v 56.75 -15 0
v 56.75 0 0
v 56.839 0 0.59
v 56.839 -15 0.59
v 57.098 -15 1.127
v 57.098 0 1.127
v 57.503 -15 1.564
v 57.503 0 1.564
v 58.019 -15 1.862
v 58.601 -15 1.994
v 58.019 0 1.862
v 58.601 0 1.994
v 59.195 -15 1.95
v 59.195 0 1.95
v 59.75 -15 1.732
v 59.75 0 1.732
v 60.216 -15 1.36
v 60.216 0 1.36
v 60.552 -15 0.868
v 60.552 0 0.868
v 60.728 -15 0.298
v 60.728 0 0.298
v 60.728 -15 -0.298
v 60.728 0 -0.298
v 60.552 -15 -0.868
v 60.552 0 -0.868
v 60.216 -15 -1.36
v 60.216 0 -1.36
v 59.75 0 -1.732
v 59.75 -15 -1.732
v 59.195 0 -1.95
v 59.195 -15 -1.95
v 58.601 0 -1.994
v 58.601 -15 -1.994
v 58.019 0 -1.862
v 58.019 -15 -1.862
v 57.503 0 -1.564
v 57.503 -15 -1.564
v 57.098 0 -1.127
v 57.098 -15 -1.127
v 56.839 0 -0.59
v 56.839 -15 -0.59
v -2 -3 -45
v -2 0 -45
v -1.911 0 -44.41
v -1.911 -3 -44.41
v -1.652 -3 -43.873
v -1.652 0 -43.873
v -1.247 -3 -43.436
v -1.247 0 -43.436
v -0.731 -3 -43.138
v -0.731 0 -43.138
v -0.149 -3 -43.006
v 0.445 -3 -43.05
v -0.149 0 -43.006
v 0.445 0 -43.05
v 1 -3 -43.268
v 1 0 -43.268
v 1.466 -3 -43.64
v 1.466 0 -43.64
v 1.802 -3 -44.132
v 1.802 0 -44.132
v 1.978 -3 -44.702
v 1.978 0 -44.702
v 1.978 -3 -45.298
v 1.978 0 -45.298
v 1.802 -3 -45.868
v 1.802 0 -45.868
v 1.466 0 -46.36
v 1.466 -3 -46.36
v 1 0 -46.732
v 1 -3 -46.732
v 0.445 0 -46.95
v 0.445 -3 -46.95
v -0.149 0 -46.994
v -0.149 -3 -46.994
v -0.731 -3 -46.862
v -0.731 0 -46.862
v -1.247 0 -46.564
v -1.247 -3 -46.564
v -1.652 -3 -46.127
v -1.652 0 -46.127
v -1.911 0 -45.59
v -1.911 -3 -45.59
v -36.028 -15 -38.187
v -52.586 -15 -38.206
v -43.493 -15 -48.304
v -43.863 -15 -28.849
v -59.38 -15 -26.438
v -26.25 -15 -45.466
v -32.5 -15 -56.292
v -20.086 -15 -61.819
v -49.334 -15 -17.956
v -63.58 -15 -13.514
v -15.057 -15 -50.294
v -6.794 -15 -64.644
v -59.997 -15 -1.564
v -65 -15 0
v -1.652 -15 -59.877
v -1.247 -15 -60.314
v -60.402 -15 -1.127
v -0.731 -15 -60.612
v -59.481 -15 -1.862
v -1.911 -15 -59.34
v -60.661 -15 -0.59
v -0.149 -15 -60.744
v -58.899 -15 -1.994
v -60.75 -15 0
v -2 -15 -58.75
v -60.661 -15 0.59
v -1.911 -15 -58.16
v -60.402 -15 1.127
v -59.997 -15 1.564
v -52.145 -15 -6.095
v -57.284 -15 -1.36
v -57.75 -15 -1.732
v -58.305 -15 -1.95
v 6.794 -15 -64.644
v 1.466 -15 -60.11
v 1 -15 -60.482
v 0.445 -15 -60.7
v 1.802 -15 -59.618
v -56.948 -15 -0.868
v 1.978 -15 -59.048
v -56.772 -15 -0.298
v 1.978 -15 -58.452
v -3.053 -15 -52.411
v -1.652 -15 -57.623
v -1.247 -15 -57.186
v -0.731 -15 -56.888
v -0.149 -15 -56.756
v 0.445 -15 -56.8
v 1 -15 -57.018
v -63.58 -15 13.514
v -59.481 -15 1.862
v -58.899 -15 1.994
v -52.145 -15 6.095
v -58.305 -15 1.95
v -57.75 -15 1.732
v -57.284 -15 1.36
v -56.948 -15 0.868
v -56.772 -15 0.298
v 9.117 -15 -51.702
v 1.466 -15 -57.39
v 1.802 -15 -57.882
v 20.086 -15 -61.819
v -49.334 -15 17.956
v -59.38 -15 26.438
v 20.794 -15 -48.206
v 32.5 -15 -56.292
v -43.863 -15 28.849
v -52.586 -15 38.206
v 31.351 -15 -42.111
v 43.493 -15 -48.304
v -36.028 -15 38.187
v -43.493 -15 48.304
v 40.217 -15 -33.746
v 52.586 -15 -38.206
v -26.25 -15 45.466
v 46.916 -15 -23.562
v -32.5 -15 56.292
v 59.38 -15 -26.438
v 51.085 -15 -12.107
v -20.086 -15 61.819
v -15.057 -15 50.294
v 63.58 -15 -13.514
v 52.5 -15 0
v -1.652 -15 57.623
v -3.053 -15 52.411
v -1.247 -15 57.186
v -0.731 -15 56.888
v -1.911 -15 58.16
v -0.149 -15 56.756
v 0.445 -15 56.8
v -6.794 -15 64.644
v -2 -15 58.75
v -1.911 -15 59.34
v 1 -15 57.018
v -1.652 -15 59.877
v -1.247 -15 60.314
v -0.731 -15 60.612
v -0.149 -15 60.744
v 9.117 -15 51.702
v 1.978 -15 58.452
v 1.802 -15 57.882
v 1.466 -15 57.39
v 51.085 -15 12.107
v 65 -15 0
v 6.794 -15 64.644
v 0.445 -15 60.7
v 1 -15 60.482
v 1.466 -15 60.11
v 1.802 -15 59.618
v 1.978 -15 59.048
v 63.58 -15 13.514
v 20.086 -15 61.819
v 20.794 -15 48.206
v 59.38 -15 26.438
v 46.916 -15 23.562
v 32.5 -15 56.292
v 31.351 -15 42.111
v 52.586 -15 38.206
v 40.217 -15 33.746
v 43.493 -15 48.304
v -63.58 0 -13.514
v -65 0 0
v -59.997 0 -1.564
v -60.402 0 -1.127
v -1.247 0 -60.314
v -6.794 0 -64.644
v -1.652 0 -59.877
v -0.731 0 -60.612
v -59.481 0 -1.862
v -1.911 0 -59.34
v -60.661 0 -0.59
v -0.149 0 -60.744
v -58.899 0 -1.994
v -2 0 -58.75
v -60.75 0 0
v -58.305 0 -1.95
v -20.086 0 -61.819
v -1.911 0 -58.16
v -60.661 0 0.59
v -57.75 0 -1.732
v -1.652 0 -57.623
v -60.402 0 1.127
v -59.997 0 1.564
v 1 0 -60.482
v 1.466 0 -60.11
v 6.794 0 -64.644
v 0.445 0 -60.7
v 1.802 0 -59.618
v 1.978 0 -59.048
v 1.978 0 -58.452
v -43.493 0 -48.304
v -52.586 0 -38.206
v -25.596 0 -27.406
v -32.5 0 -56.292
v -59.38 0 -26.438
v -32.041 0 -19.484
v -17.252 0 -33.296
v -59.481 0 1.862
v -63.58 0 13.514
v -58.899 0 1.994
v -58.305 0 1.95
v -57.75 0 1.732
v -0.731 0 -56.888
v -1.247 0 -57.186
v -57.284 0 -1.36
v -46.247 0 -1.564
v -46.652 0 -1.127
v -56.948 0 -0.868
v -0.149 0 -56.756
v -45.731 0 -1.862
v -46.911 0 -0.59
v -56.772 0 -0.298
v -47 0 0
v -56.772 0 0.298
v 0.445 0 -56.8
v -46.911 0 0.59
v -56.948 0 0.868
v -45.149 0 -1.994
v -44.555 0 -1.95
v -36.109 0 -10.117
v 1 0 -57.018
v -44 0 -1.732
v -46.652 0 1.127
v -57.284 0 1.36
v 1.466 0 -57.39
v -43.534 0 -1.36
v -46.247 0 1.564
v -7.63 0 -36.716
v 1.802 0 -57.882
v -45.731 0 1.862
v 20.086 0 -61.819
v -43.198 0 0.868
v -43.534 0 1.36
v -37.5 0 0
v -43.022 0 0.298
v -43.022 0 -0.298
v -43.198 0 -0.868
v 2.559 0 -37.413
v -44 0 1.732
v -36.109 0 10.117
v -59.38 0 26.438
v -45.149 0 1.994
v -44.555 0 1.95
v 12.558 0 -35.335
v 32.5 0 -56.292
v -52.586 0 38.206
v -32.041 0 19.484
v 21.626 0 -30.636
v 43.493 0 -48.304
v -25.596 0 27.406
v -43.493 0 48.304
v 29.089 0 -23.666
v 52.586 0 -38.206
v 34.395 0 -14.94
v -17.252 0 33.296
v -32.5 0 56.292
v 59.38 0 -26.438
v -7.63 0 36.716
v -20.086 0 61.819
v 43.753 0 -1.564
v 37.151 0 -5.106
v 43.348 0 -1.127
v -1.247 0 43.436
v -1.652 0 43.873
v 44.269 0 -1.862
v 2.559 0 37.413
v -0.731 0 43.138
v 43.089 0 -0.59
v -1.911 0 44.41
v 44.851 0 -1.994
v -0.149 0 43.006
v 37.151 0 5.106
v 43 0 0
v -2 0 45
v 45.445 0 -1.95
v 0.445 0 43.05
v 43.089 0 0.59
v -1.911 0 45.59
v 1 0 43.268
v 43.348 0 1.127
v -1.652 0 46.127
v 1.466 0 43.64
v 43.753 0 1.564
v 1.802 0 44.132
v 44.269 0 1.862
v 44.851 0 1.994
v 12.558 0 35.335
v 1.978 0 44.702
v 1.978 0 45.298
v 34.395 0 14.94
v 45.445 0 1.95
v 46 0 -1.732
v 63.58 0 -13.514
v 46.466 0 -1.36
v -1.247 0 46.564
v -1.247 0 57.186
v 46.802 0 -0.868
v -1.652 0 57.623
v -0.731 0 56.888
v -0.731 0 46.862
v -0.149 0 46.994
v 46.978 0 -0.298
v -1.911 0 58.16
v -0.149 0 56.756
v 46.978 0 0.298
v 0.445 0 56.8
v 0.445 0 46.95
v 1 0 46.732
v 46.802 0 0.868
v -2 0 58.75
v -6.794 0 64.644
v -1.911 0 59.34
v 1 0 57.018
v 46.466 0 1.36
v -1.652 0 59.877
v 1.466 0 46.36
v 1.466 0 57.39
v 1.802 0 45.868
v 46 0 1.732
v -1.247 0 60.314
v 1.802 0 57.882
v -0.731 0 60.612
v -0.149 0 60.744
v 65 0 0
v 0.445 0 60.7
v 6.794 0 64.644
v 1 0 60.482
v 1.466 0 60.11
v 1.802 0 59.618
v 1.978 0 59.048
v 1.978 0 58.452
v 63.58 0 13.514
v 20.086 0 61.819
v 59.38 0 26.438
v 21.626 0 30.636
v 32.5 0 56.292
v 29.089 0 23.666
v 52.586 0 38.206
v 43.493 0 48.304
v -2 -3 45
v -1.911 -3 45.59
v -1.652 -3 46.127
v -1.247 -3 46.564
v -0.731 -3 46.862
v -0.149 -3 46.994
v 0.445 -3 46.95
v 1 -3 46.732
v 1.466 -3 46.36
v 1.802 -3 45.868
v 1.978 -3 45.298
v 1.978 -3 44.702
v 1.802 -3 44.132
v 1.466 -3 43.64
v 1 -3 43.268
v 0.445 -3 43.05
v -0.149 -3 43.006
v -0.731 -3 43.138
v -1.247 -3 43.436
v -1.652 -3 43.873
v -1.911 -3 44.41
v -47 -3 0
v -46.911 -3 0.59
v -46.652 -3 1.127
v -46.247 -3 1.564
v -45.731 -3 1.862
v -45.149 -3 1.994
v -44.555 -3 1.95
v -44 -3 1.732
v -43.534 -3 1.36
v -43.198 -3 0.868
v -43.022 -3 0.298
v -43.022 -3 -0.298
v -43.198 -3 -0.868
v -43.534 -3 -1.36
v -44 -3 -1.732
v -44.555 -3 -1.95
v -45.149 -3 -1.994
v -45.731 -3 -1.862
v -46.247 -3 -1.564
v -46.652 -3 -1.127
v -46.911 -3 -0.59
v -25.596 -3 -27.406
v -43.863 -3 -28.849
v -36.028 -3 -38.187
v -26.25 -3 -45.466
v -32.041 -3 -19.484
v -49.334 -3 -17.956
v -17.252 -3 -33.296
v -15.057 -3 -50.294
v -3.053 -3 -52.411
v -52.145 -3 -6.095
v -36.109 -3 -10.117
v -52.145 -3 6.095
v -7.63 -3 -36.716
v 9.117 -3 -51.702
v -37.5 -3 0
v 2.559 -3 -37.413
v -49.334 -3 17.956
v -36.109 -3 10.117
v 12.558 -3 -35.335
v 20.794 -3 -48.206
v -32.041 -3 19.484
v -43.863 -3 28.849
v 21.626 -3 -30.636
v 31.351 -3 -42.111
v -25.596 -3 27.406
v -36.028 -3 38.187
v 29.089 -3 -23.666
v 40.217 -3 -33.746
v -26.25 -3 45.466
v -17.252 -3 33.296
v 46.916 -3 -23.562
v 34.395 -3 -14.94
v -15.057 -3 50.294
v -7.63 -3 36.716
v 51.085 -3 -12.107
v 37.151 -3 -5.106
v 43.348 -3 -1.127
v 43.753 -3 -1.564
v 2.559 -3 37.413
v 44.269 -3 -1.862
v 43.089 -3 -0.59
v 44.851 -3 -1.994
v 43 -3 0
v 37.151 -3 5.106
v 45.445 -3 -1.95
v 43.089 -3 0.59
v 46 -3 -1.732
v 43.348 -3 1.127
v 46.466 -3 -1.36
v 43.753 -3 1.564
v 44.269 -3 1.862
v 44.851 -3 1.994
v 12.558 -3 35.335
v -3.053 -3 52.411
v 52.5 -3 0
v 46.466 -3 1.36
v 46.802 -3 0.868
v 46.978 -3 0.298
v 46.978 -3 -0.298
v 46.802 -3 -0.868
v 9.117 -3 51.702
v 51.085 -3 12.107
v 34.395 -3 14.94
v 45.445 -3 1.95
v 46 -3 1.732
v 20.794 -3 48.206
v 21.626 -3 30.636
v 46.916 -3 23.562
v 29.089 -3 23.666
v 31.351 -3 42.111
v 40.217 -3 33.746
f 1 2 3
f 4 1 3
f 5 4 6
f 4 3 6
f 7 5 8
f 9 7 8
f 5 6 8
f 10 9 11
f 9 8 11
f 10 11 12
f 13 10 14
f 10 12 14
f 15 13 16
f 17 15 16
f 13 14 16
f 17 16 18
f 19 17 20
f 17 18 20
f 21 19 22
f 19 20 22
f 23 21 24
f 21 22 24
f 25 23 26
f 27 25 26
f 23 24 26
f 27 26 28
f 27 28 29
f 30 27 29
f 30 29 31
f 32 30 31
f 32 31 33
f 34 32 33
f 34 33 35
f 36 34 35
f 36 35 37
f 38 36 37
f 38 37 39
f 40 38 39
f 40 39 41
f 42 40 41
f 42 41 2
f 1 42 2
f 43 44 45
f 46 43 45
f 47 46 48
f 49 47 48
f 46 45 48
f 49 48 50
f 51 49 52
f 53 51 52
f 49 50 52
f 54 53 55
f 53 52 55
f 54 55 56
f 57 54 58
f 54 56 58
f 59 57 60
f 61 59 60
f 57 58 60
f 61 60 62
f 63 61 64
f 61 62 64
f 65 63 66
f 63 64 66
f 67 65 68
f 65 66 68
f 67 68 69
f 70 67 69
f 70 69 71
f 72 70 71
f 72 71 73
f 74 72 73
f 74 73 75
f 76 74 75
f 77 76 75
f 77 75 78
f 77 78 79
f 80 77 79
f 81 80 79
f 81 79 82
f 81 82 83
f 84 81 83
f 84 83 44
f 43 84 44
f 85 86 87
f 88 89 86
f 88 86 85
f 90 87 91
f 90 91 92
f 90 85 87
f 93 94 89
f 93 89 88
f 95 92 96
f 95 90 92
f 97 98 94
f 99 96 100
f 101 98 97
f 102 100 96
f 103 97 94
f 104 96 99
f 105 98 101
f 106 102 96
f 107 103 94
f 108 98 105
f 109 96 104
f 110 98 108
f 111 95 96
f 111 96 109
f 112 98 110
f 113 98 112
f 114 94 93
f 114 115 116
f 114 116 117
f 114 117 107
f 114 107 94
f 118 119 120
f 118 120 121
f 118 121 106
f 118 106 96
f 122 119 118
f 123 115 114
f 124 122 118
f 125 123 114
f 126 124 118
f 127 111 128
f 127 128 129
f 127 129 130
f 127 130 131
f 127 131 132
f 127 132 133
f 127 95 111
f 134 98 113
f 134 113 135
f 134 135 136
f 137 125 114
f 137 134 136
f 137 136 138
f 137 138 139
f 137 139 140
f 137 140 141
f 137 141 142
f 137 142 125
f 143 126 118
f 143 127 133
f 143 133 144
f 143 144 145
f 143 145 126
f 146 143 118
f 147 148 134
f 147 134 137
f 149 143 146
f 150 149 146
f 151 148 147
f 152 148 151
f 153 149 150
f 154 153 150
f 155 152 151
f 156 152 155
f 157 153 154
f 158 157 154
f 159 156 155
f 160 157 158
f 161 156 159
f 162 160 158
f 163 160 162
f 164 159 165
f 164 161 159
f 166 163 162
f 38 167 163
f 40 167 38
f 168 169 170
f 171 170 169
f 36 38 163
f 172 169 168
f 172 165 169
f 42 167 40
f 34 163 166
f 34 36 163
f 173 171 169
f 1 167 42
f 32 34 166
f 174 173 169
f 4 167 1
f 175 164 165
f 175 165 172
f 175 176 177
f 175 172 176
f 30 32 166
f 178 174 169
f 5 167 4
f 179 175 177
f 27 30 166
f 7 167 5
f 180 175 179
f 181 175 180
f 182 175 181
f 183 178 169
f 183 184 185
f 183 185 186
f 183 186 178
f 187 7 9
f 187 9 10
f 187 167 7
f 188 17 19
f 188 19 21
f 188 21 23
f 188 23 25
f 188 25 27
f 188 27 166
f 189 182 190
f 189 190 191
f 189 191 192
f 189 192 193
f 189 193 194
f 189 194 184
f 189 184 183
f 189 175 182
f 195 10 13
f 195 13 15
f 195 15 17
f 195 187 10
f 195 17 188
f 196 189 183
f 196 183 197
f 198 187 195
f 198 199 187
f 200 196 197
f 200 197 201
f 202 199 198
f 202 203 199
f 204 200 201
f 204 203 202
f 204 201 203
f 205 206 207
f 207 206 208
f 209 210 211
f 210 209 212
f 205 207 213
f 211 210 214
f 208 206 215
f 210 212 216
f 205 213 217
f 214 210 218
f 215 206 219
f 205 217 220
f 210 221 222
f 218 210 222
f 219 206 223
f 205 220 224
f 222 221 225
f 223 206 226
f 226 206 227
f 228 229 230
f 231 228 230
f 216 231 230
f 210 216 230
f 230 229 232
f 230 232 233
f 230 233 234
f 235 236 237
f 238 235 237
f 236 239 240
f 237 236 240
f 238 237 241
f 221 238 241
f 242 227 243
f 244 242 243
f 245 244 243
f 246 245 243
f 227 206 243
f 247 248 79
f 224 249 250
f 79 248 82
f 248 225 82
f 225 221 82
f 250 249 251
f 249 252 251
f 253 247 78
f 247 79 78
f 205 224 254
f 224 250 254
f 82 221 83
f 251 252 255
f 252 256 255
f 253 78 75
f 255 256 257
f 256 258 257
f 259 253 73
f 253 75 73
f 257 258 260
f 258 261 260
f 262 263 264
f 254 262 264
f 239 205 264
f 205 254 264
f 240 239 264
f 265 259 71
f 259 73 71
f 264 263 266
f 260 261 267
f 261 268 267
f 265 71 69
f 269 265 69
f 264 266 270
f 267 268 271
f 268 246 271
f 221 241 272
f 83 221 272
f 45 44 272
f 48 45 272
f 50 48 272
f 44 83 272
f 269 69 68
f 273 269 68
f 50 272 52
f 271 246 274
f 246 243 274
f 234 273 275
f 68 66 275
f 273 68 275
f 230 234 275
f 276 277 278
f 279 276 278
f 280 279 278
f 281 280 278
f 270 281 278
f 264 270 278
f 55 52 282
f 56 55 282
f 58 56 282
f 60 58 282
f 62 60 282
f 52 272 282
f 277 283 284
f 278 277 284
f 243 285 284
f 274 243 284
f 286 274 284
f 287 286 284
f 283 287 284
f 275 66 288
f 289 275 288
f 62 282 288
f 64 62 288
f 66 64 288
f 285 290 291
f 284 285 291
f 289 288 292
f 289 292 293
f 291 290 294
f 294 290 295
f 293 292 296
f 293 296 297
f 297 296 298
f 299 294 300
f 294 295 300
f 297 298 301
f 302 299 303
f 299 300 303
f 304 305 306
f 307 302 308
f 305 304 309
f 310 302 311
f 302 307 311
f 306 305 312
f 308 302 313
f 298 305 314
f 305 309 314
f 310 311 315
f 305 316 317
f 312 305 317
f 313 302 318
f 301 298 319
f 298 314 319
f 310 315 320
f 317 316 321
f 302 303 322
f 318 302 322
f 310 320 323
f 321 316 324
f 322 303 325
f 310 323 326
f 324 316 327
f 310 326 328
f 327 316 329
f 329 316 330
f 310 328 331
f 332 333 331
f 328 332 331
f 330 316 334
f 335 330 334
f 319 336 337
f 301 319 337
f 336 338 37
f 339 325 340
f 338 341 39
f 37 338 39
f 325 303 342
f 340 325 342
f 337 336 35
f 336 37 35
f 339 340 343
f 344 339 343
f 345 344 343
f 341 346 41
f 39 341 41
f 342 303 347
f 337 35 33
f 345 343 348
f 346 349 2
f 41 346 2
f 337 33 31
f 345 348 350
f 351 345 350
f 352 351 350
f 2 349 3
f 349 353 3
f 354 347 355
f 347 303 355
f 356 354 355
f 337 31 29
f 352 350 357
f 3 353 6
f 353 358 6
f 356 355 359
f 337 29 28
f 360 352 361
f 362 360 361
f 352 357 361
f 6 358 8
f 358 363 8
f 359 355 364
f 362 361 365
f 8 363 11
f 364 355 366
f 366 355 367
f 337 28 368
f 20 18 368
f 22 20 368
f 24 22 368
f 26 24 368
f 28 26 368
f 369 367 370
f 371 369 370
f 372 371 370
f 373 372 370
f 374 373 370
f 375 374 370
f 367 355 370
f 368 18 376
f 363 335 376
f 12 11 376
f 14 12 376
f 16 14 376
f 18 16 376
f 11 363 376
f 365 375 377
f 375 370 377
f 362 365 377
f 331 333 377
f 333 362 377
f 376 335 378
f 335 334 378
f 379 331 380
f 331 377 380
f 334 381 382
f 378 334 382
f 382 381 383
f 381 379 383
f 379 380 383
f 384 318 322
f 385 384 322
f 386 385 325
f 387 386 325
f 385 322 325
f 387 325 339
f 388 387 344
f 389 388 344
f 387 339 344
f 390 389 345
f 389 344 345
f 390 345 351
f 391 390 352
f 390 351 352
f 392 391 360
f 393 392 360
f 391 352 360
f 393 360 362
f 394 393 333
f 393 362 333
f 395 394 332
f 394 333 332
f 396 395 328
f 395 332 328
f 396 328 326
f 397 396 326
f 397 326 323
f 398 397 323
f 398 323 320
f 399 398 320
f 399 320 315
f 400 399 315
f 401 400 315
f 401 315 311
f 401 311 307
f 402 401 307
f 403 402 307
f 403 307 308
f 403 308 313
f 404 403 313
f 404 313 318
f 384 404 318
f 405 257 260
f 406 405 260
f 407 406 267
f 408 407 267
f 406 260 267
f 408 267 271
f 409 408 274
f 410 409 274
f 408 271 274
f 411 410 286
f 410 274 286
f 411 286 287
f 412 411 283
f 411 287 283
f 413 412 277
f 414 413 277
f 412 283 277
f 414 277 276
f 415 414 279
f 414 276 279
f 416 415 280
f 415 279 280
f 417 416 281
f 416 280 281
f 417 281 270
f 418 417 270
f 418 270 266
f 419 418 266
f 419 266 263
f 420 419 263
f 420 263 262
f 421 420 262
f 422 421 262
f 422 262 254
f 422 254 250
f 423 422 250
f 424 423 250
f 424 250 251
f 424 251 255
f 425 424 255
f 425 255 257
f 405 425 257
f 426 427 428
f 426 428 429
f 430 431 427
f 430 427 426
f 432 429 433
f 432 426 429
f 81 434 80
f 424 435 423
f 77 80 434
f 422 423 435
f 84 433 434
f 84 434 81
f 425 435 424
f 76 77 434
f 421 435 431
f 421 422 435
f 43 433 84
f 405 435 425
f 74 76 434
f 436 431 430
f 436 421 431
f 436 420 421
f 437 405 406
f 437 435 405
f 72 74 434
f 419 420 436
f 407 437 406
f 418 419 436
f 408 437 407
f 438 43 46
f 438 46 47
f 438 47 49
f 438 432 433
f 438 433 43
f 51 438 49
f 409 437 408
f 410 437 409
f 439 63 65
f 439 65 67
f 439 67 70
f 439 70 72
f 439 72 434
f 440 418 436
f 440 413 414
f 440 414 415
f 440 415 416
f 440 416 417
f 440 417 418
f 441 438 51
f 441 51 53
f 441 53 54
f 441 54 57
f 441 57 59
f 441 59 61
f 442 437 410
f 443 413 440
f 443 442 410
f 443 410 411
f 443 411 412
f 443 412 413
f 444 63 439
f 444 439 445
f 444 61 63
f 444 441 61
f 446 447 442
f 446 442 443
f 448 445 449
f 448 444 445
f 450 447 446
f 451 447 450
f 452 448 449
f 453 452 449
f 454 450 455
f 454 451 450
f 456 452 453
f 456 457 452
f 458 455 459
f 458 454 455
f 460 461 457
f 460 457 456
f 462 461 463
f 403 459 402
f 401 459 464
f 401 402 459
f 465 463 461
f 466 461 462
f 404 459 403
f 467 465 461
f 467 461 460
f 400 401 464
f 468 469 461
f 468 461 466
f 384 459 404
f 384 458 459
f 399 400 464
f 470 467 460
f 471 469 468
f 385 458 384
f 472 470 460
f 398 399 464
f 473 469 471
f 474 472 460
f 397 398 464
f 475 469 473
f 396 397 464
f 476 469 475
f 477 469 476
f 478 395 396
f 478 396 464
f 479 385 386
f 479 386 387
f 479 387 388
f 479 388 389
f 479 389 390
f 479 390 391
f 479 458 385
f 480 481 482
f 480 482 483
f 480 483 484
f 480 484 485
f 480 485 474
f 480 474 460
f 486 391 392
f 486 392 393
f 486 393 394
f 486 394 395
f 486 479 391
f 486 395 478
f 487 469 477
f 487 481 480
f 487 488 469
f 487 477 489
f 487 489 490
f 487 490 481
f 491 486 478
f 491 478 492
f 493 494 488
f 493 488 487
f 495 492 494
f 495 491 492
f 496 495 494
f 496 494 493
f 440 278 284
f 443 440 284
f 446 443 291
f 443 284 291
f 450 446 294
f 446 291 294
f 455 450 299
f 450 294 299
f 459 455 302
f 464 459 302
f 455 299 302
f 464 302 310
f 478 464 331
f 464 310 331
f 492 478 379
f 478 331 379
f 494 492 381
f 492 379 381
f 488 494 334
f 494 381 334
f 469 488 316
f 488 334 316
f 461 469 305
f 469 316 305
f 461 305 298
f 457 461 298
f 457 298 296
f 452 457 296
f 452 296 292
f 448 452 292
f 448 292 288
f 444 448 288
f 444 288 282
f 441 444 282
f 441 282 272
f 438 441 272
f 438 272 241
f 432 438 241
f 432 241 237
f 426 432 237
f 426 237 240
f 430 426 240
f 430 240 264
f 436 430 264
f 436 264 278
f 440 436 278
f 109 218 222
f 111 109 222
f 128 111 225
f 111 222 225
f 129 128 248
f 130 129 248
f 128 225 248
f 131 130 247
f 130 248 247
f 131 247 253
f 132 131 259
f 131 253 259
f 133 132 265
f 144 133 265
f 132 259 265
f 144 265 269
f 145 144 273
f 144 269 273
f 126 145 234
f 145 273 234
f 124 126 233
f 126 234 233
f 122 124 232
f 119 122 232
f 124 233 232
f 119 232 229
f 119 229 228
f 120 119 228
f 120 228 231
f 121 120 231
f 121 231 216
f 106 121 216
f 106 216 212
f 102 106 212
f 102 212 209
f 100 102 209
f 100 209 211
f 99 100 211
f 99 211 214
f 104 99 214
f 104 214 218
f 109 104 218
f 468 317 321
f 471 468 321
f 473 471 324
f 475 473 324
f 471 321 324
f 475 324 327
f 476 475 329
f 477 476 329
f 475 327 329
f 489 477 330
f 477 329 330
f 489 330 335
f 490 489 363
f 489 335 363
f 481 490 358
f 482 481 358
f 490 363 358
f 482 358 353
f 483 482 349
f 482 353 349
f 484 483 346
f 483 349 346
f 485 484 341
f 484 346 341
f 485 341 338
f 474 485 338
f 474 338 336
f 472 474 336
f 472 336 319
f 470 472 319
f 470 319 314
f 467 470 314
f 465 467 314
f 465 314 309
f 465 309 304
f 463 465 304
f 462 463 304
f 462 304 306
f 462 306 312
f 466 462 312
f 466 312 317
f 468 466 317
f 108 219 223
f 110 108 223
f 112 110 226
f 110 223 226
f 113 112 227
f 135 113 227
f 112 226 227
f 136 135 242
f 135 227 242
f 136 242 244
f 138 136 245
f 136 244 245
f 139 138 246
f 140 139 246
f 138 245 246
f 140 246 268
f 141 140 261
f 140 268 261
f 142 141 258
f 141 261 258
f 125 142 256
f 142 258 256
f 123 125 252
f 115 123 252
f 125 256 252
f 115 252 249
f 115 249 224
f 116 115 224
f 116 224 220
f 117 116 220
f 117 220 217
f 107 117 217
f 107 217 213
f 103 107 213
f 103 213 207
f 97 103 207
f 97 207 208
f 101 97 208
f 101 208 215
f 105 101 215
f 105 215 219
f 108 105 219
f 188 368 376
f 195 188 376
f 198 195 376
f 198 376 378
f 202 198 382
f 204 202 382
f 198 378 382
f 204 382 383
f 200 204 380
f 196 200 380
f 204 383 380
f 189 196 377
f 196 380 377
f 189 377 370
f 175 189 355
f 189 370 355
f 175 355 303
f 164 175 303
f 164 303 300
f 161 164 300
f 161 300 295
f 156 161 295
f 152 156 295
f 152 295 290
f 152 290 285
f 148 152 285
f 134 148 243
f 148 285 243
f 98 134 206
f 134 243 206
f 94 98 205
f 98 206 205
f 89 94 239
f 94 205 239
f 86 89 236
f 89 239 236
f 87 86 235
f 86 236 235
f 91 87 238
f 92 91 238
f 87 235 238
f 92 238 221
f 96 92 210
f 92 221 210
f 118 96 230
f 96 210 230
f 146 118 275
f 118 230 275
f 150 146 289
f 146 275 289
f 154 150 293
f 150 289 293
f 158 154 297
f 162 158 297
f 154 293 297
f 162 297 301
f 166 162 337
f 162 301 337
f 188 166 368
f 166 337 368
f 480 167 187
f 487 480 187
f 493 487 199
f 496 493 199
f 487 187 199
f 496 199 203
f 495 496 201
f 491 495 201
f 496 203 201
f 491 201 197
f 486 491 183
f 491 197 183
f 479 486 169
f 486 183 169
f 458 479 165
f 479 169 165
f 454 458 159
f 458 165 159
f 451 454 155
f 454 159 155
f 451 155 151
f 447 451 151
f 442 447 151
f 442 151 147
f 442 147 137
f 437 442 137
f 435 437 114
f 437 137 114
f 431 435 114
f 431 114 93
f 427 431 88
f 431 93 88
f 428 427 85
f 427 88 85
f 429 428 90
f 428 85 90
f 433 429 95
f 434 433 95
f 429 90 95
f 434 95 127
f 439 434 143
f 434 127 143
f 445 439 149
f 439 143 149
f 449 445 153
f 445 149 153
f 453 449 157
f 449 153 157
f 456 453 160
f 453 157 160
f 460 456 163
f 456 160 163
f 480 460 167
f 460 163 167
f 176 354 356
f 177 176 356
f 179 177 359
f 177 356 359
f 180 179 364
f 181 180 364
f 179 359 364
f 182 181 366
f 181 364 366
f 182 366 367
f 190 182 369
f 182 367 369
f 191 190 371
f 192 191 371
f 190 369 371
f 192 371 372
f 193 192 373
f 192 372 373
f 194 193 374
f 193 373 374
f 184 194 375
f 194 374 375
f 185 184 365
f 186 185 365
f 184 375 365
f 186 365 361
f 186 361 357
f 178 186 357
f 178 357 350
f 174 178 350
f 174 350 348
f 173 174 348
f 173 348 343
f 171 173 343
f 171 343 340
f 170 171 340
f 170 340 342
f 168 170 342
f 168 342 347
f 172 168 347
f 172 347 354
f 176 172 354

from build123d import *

# Parameters (mm, degrees)
F0_R     = 65
F1_DEPTH = 15
F2_R     = 52.5
F3_DEPTH = 12
F5_D     = 4
F5_DEPTH = 25
F7_D     = 4
F7_DEPTH = 25
F8_R     = 37.5
F9_DEPTH = 25


with BuildPart() as f1:
    # F0 (on Front) → F1 (new body)
    with BuildSketch(Plane.XZ):
        Circle(F0_R)
    extrude(amount=F1_DEPTH)

    # F2 (on face) → F3 (cut)
    with BuildSketch(Plane.XZ.offset(15)):
        Circle(F2_R)
    extrude(amount=-F3_DEPTH, mode=Mode.SUBTRACT)

    # F5
    with Locations(Plane.XZ.offset(15)):
        with Locations((-58.75, 0), (0, 58.75), (58.75, 0), (0, -58.75)):
            Hole(F5_D / 2, depth=F5_DEPTH)

    # F7
    with Locations(Plane.XZ.offset(3)):
        with Locations((0, 45), (-45, 0), (45, 0), (0, -45)):
            Hole(F7_D / 2, depth=F7_DEPTH)

    # F8 (on face) → F9 (cut)
    with BuildSketch(Plane(origin=(0, 0, 0), x_dir=(-1, 0, 0), z_dir=(0, 1, 0))):
        Circle(F8_R)
    extrude(amount=-F9_DEPTH, mode=Mode.SUBTRACT)


solid = f1.part
